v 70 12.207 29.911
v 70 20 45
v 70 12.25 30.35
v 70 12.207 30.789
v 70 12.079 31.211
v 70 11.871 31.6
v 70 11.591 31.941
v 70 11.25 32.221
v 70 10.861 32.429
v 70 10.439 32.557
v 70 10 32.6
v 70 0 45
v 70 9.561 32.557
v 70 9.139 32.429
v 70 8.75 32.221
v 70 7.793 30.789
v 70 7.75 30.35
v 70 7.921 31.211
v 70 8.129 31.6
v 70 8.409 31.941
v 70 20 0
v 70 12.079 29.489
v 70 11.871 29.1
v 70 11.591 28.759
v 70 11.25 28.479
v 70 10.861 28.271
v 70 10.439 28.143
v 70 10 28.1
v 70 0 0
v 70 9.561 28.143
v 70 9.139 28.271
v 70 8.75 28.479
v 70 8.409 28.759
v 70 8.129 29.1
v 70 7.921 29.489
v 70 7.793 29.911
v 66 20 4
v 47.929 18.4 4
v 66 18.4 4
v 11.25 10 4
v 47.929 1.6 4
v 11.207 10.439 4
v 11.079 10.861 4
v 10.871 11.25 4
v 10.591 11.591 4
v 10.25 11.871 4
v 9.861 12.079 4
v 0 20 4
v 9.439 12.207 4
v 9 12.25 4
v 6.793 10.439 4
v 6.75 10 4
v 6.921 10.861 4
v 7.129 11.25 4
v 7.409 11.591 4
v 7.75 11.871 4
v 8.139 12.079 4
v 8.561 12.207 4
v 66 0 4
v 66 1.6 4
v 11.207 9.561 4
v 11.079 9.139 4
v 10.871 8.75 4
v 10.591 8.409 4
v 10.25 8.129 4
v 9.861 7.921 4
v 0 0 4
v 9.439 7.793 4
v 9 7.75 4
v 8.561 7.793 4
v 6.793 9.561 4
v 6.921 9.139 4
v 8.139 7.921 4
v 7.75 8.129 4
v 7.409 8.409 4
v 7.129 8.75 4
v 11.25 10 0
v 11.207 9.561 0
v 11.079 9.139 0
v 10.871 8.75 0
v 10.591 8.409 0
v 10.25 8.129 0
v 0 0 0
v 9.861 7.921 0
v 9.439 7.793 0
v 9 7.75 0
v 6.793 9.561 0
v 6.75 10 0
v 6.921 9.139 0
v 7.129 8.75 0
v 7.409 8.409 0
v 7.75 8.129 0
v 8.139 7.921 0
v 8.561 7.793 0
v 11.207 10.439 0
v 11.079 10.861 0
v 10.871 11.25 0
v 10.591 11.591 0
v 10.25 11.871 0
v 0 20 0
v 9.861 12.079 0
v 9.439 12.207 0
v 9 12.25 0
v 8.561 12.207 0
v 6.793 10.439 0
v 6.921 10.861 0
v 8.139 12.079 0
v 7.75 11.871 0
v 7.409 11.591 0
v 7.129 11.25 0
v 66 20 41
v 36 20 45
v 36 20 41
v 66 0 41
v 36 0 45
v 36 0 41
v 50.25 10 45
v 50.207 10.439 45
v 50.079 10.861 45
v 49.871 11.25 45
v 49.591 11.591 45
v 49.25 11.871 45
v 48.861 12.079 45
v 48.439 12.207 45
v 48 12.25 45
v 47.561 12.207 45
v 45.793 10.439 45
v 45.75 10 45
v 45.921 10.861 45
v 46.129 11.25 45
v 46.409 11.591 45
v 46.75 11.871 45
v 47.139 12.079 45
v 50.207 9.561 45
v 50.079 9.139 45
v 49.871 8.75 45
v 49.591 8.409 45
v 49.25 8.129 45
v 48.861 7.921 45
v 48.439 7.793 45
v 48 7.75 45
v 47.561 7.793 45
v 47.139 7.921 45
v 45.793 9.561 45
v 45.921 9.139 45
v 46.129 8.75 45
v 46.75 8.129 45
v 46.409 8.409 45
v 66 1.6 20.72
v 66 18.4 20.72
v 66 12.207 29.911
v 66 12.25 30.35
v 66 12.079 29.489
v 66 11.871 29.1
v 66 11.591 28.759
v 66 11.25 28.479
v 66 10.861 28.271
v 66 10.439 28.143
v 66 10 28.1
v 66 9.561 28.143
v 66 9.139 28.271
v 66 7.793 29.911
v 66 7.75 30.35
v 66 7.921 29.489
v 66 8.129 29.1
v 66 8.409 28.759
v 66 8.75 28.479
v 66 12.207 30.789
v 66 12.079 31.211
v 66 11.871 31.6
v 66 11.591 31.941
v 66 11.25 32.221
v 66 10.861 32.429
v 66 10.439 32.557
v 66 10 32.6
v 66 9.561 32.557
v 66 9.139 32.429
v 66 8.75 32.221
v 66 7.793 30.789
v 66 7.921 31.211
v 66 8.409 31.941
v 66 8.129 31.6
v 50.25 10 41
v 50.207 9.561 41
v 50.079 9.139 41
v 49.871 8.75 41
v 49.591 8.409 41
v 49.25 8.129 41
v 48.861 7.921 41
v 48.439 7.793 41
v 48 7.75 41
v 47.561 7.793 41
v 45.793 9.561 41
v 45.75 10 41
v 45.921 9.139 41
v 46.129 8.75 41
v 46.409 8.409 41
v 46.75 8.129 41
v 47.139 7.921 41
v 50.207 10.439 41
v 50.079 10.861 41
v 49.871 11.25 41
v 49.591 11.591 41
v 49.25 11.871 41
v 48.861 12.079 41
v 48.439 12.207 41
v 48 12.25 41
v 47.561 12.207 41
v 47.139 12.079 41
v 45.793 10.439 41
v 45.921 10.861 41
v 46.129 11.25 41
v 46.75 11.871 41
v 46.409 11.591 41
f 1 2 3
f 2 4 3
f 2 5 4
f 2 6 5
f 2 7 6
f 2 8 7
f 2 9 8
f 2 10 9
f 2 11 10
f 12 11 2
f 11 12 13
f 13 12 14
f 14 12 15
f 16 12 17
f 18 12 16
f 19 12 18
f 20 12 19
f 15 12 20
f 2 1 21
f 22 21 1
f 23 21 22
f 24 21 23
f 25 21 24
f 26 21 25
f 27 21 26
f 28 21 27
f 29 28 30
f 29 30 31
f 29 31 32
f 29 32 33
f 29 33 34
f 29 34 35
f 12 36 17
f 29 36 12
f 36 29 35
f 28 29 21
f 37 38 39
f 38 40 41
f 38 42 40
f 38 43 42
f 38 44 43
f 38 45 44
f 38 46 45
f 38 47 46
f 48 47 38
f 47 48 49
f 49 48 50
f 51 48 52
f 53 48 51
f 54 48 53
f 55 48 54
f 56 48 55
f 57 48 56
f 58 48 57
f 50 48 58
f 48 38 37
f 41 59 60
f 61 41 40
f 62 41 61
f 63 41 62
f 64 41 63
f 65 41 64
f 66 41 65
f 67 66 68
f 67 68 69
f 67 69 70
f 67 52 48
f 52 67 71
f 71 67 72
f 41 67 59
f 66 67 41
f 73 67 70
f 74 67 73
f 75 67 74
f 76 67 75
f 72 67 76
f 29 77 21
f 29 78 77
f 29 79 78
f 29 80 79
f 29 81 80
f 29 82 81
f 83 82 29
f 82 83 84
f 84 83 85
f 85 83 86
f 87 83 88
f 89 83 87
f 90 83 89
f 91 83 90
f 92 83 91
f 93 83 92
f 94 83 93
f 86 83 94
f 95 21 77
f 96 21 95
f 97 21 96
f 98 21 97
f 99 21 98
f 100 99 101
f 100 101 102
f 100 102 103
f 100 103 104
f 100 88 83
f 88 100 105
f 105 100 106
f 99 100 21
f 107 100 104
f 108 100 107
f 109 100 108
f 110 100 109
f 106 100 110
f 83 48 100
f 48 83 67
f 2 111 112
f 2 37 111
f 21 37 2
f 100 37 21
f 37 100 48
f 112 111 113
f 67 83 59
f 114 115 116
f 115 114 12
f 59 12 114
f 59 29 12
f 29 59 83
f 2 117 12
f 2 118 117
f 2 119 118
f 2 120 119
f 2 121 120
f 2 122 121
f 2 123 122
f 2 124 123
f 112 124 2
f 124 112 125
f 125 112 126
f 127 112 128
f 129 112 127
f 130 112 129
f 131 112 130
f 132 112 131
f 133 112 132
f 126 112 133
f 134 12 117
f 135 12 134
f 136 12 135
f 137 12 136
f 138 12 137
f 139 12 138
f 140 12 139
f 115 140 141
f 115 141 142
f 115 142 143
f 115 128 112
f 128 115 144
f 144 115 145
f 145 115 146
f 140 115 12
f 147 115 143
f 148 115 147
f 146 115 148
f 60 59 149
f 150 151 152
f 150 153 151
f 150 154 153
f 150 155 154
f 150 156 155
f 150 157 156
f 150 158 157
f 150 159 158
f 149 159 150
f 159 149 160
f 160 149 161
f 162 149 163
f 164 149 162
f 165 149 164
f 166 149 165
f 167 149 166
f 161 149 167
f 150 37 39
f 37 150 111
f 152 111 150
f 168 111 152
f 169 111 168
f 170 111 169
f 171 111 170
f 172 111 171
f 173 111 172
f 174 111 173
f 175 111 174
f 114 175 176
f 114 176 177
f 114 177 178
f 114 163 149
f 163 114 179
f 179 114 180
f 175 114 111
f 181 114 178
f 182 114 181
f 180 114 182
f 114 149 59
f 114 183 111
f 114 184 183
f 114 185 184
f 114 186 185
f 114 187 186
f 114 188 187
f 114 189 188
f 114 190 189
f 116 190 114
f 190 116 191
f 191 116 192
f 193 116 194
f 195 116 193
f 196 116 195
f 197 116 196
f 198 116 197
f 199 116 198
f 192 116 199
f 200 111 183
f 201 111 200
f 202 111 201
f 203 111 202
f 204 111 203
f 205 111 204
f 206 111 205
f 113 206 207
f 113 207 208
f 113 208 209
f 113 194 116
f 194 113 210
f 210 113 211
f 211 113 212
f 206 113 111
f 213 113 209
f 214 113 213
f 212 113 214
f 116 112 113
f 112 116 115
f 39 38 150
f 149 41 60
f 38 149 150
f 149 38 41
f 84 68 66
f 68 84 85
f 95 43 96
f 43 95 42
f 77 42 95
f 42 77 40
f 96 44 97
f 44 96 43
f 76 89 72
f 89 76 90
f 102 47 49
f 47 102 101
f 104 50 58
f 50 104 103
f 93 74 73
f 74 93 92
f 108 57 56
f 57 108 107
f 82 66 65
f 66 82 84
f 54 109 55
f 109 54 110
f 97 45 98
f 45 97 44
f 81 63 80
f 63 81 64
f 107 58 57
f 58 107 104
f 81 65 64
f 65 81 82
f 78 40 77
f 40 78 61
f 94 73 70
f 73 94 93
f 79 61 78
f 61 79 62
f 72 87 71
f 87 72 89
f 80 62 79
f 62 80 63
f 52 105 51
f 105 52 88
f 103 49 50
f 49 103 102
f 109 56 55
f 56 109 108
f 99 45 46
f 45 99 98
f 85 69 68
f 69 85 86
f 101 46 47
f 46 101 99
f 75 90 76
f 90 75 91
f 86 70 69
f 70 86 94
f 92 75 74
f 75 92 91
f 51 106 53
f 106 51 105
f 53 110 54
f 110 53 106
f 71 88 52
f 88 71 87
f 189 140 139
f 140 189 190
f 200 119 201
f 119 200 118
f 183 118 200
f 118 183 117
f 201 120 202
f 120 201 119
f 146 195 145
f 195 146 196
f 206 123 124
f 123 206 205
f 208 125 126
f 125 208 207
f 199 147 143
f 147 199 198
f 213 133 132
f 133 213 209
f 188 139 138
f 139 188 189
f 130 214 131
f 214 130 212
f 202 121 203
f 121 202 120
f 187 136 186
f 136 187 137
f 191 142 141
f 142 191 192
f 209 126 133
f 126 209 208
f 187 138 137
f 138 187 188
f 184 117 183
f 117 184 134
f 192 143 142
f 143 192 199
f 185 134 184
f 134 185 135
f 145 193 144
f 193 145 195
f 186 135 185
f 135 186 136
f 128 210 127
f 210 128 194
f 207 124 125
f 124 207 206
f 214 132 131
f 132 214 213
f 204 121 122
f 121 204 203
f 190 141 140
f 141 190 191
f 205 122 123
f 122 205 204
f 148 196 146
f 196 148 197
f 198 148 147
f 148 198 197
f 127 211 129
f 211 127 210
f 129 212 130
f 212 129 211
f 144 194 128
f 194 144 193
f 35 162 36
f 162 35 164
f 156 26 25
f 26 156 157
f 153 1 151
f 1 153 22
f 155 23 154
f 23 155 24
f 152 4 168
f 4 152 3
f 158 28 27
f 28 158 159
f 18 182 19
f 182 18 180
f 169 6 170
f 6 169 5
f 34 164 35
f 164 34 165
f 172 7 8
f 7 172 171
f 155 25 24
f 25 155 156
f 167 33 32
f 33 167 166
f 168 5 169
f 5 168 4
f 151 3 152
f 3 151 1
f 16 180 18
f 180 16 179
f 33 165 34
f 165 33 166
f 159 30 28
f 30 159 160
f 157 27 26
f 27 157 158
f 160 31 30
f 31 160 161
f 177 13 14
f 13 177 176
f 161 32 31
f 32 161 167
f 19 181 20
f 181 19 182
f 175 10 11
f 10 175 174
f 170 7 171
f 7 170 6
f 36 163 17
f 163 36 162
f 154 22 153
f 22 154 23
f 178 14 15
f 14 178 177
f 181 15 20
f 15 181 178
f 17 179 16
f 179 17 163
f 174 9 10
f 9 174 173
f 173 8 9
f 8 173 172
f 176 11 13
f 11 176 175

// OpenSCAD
$fn = 32;

// ----------------------------------------------------------------------
// Z-bracket: 70 x 20 x 45 mm
// ----------------------------------------------------------------------

// --- parameters (mm) ---
foot_len = 70;            // lower foot length, X
top_len = 30;             // upper foot length, X
depth = 20;               // bracket width, Y
step_h = 45;              // overall rise, Z
plate_t = 4;              // plate thickness
hole_d = 4.5;             // clearance for M4
rib_len = 19.8;           // gusset leg
rib_sink = 1.6;           // gusset overlap into the plates

module hole_z(px, py, z0) {
  translate([px, py, z0 - 2.5]) cylinder(h = plate_t + 5, d = hole_d);
}
module hole_x(py, pz) {
  translate([-2.5, py, pz]) rotate([0, 90, 0]) cylinder(h = plate_t + 5, d = hole_d);
}
module gusset(x0) {
  translate([x0, depth - rib_sink, 0])
    rotate([90, 0, 0])
      linear_extrude(height = depth - 2 * rib_sink)
        polygon(points = [[rib_sink, plate_t - rib_sink],
                          [rib_sink, plate_t - rib_sink + rib_len],
                          [-rib_len, plate_t - rib_sink]]);
}

difference() {
  union() {
    cube([foot_len, depth, plate_t]);
    /* web, overlapping the lower foot */
    translate([foot_len - plate_t, 0, 0]) cube([plate_t, depth, step_h]);
    /* upper foot, sunk into the web */
    translate([foot_len - plate_t - top_len, 0, step_h - plate_t]) cube([top_len + plate_t, depth, plate_t]);
    gusset(foot_len - plate_t);
  }
  hole_z(9, 10, 0);
  translate([foot_len - plate_t - 18, 0, 0]) hole_z(0, 10, step_h - plate_t);
  translate([foot_len - plate_t, 0, 0]) hole_x(10, 30.35);
}
